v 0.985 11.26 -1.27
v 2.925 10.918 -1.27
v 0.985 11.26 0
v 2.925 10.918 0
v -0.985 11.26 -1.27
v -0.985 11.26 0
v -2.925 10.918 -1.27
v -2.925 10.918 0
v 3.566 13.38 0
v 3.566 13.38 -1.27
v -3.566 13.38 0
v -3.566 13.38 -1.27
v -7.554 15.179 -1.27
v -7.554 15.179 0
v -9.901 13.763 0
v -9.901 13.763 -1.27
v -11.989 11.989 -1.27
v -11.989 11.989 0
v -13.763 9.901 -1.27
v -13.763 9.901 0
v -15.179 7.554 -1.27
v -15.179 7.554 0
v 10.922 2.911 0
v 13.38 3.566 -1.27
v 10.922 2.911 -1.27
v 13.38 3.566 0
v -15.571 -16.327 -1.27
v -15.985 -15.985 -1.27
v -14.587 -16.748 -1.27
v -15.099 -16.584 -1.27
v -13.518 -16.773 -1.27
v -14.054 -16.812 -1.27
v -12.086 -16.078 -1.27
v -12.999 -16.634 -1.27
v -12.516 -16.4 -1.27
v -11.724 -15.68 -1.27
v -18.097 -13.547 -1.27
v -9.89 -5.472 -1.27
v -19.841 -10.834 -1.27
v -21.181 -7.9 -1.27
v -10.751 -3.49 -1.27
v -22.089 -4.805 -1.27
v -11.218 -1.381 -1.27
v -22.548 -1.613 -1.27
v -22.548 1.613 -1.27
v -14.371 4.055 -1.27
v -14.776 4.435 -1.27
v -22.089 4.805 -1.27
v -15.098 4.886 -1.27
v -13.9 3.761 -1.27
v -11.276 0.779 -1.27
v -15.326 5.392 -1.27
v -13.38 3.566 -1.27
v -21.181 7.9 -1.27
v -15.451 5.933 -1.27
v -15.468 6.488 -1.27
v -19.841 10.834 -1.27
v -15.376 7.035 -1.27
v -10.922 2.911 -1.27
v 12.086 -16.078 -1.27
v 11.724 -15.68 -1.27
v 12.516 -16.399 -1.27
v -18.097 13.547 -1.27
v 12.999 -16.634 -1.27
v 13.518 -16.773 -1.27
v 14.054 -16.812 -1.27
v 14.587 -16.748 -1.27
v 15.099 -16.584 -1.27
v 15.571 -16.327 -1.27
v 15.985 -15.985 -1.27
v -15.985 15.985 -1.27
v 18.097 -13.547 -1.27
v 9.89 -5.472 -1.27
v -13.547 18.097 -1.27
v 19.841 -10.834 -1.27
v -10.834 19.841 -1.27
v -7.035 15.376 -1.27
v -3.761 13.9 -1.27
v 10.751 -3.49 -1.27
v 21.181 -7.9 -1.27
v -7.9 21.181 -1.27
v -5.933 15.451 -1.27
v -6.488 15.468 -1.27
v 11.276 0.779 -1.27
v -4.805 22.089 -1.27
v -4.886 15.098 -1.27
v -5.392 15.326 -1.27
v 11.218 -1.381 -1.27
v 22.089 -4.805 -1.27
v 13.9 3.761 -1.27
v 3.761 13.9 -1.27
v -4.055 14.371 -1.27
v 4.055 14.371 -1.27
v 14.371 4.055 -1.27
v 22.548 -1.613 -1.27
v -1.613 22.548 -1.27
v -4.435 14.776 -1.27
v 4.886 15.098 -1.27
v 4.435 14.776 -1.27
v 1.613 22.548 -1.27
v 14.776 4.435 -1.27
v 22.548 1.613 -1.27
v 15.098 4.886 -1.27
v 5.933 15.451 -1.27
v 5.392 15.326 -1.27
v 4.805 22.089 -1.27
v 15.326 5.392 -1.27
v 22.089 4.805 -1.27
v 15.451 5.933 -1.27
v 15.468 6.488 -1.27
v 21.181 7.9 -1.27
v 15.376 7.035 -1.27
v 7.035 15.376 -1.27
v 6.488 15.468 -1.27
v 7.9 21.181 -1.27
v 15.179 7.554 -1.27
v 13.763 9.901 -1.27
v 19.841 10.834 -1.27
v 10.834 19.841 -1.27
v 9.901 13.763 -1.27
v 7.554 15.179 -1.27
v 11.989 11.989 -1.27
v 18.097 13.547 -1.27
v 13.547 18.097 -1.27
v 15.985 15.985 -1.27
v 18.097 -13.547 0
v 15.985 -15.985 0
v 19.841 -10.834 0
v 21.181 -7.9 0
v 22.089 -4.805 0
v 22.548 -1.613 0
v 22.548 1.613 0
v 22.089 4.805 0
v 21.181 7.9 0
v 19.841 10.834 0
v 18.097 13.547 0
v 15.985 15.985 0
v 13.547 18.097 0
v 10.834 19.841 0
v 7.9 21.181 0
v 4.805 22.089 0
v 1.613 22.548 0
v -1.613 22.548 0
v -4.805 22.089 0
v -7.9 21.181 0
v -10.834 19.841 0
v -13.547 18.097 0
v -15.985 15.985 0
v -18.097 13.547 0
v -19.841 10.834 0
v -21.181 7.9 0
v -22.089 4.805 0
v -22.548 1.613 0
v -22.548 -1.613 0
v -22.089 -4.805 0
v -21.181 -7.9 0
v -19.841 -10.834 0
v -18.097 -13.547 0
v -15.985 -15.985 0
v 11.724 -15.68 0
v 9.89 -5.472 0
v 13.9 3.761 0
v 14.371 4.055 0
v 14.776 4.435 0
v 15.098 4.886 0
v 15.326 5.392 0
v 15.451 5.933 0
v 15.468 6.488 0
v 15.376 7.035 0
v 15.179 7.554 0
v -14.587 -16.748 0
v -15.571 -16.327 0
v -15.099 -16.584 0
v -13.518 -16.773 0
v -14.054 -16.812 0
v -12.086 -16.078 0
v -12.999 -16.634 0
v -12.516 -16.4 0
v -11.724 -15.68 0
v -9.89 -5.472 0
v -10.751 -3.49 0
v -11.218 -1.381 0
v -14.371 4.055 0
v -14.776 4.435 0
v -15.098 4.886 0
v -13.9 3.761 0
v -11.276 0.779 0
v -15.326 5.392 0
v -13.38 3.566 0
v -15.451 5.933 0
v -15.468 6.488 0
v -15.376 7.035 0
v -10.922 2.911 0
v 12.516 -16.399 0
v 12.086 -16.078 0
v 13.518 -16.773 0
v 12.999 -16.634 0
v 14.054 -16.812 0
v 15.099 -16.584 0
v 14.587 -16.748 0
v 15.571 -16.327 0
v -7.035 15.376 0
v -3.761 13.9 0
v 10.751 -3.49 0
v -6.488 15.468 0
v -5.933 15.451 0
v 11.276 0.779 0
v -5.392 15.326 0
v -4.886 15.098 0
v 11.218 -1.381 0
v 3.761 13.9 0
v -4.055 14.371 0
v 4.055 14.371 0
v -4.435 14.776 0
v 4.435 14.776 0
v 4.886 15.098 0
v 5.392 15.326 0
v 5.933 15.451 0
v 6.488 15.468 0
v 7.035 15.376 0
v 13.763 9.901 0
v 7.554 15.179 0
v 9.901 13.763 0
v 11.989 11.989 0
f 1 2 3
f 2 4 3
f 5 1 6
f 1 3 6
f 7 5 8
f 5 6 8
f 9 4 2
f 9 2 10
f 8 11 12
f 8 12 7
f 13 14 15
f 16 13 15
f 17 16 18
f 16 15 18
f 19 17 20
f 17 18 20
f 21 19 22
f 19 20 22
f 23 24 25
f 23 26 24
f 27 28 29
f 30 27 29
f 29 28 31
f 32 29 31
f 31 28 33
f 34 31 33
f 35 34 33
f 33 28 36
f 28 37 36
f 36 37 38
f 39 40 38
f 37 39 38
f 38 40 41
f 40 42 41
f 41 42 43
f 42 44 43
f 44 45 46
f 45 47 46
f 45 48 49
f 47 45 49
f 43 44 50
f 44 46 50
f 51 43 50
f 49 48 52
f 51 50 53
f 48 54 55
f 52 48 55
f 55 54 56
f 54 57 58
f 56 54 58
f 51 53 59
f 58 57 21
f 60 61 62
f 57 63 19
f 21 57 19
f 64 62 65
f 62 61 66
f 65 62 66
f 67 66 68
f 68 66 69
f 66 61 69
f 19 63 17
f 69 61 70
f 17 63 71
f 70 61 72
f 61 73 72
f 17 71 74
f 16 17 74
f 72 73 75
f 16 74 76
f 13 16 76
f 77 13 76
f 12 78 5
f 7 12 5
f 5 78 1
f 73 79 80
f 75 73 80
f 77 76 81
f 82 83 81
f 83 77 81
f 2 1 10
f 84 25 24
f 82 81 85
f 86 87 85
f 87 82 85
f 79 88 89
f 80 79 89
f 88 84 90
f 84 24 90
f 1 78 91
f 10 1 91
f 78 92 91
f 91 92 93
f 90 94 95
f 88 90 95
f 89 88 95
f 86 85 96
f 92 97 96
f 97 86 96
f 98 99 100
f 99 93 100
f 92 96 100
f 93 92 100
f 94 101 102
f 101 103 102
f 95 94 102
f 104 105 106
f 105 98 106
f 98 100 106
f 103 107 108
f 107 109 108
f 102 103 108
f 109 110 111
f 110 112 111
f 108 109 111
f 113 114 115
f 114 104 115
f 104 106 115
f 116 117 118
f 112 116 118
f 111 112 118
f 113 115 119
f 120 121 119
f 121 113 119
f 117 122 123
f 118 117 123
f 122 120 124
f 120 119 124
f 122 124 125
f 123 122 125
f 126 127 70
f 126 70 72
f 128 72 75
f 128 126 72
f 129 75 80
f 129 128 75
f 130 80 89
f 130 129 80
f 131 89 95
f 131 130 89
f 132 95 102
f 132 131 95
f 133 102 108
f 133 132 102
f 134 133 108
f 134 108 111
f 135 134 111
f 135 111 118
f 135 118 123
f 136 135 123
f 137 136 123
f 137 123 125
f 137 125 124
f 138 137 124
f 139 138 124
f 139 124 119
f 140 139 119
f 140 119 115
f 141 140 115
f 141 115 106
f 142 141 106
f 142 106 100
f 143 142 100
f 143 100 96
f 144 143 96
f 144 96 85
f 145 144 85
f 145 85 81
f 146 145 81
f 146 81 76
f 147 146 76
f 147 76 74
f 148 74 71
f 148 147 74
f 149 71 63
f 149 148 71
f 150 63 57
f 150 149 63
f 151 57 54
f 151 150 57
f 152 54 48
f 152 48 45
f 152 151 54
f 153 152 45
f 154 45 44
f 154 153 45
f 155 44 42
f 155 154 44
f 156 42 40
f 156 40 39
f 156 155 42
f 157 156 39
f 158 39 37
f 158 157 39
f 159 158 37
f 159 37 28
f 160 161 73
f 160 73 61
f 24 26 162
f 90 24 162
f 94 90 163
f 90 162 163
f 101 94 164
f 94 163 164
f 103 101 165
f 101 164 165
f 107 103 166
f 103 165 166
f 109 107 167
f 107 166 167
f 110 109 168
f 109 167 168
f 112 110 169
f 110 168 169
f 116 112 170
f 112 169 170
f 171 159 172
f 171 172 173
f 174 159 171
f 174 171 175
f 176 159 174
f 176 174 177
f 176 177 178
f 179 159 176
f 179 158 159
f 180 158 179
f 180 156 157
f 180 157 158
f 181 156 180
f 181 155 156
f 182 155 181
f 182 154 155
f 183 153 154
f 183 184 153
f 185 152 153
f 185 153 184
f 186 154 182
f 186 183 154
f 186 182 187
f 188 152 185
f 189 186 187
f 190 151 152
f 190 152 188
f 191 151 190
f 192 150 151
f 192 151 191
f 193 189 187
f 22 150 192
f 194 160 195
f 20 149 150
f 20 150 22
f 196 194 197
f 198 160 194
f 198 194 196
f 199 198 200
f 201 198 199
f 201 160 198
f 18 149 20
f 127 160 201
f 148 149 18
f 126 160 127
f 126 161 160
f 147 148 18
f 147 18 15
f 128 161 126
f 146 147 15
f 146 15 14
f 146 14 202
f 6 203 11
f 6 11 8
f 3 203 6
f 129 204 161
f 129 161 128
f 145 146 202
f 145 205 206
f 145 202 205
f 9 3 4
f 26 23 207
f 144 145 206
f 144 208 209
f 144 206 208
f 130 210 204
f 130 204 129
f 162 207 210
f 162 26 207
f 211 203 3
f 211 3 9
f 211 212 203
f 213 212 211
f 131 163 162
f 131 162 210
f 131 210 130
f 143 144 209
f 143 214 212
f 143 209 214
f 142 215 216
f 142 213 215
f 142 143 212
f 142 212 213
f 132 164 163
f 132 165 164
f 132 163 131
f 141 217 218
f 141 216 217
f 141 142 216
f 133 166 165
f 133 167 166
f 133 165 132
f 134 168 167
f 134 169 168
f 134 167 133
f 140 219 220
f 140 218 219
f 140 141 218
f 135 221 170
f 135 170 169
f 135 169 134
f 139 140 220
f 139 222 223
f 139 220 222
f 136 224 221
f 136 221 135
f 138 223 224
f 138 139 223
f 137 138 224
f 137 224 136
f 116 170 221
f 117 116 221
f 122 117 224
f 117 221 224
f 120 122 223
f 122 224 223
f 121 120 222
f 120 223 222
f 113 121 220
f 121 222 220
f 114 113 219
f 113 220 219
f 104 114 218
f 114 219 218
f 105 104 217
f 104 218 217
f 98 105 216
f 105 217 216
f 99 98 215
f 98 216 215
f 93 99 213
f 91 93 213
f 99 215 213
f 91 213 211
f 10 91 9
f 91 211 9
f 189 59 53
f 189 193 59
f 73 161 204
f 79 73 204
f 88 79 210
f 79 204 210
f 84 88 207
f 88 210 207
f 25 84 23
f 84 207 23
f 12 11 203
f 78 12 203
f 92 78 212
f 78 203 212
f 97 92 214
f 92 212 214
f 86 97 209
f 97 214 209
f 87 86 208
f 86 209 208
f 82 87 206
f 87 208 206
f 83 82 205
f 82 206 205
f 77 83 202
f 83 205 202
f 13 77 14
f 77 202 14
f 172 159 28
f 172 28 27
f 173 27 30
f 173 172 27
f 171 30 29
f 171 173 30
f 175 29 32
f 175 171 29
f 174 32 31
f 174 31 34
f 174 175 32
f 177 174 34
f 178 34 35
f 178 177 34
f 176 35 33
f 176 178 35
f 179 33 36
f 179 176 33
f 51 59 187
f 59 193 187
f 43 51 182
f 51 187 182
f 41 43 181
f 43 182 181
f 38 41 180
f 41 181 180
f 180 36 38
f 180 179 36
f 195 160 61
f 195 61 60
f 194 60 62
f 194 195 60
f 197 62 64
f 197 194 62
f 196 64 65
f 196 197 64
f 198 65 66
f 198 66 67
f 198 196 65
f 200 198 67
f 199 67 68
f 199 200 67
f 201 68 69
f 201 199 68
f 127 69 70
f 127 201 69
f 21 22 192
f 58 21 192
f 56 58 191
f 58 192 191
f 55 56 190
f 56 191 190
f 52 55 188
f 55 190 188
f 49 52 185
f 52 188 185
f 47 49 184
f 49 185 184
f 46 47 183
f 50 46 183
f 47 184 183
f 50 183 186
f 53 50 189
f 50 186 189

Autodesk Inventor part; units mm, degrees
ref_plane "YZ Plane" through (0, 0, 0) normal (1, 0, 0) x (0, 1, 0)
ref_plane "XZ Plane" through (0, 0, 0) normal (0, 1, 0) x (-1, 0, 0)
ref_plane "XY Plane" through (0, 0, 0) normal (0, 0, 1) x (1, 0, 0)
sketch "Sketch1" plane through (0, 0, 0) normal (0, 0, 1) x (1, 0, 0)
  arc A0 (11.7245, -15.68) -> (15.9849, -15.9849) centre (13.9867, -13.9867) ccw
  arc A1 (15.9849, -15.9849) -> (-15.9849, -15.9849) centre (0, 0) ccw
  arc A2 (-15.9849, -15.9849) -> (-11.7245, -15.68) centre (-13.9867, -13.9867) ccw
  line L0 (-11.7245, -15.68) -> (-9.8901, -5.472)
  arc A3 (-10.9218, 2.9106) -> (-9.8901, -5.472) centre (0, 0) ccw
  line L1 (-10.9218, 2.9106) -> (-13.3802, 3.5657)
  arc A4 (-15.1786, 7.5542) -> (-13.3802, 3.5657) centre (-12.6488, 6.2952) ccw
  arc A5 (-7.5542, 15.1786) -> (-15.1786, 7.5542) centre (0, 0) ccw
  arc A6 (-3.5657, 13.3802) -> (-7.5542, 15.1786) centre (-6.2952, 12.6488) ccw
  line L2 (-3.5657, 13.3802) -> (-2.9254, 10.9179)
  arc A7 (2.9254, 10.9179) -> (-2.9254, 10.9179) centre (0, 0) ccw
  line L3 (2.9254, 10.9179) -> (3.5657, 13.3802)
  arc A8 (7.5542, 15.1786) -> (3.5657, 13.3802) centre (6.2952, 12.6488) ccw
  arc A9 (15.1786, 7.5542) -> (7.5542, 15.1786) centre (0, 0) ccw
  arc A10 (13.3802, 3.5657) -> (15.1786, 7.5542) centre (12.6488, 6.2952) ccw
  line L4 (13.3802, 3.5657) -> (10.9218, 2.9106)
  arc A11 (9.8901, -5.472) -> (10.9218, 2.9106) centre (0, 0) ccw
  line L5 (9.8901, -5.472) -> (11.7245, -15.68)
  dimension "d0" = 22.606
  dimension "d2" = 11.303
extrude "Extrusion1" add sketch "Sketch1" against normal blind 1.27
properties part number "am-0206" material "Steel"
